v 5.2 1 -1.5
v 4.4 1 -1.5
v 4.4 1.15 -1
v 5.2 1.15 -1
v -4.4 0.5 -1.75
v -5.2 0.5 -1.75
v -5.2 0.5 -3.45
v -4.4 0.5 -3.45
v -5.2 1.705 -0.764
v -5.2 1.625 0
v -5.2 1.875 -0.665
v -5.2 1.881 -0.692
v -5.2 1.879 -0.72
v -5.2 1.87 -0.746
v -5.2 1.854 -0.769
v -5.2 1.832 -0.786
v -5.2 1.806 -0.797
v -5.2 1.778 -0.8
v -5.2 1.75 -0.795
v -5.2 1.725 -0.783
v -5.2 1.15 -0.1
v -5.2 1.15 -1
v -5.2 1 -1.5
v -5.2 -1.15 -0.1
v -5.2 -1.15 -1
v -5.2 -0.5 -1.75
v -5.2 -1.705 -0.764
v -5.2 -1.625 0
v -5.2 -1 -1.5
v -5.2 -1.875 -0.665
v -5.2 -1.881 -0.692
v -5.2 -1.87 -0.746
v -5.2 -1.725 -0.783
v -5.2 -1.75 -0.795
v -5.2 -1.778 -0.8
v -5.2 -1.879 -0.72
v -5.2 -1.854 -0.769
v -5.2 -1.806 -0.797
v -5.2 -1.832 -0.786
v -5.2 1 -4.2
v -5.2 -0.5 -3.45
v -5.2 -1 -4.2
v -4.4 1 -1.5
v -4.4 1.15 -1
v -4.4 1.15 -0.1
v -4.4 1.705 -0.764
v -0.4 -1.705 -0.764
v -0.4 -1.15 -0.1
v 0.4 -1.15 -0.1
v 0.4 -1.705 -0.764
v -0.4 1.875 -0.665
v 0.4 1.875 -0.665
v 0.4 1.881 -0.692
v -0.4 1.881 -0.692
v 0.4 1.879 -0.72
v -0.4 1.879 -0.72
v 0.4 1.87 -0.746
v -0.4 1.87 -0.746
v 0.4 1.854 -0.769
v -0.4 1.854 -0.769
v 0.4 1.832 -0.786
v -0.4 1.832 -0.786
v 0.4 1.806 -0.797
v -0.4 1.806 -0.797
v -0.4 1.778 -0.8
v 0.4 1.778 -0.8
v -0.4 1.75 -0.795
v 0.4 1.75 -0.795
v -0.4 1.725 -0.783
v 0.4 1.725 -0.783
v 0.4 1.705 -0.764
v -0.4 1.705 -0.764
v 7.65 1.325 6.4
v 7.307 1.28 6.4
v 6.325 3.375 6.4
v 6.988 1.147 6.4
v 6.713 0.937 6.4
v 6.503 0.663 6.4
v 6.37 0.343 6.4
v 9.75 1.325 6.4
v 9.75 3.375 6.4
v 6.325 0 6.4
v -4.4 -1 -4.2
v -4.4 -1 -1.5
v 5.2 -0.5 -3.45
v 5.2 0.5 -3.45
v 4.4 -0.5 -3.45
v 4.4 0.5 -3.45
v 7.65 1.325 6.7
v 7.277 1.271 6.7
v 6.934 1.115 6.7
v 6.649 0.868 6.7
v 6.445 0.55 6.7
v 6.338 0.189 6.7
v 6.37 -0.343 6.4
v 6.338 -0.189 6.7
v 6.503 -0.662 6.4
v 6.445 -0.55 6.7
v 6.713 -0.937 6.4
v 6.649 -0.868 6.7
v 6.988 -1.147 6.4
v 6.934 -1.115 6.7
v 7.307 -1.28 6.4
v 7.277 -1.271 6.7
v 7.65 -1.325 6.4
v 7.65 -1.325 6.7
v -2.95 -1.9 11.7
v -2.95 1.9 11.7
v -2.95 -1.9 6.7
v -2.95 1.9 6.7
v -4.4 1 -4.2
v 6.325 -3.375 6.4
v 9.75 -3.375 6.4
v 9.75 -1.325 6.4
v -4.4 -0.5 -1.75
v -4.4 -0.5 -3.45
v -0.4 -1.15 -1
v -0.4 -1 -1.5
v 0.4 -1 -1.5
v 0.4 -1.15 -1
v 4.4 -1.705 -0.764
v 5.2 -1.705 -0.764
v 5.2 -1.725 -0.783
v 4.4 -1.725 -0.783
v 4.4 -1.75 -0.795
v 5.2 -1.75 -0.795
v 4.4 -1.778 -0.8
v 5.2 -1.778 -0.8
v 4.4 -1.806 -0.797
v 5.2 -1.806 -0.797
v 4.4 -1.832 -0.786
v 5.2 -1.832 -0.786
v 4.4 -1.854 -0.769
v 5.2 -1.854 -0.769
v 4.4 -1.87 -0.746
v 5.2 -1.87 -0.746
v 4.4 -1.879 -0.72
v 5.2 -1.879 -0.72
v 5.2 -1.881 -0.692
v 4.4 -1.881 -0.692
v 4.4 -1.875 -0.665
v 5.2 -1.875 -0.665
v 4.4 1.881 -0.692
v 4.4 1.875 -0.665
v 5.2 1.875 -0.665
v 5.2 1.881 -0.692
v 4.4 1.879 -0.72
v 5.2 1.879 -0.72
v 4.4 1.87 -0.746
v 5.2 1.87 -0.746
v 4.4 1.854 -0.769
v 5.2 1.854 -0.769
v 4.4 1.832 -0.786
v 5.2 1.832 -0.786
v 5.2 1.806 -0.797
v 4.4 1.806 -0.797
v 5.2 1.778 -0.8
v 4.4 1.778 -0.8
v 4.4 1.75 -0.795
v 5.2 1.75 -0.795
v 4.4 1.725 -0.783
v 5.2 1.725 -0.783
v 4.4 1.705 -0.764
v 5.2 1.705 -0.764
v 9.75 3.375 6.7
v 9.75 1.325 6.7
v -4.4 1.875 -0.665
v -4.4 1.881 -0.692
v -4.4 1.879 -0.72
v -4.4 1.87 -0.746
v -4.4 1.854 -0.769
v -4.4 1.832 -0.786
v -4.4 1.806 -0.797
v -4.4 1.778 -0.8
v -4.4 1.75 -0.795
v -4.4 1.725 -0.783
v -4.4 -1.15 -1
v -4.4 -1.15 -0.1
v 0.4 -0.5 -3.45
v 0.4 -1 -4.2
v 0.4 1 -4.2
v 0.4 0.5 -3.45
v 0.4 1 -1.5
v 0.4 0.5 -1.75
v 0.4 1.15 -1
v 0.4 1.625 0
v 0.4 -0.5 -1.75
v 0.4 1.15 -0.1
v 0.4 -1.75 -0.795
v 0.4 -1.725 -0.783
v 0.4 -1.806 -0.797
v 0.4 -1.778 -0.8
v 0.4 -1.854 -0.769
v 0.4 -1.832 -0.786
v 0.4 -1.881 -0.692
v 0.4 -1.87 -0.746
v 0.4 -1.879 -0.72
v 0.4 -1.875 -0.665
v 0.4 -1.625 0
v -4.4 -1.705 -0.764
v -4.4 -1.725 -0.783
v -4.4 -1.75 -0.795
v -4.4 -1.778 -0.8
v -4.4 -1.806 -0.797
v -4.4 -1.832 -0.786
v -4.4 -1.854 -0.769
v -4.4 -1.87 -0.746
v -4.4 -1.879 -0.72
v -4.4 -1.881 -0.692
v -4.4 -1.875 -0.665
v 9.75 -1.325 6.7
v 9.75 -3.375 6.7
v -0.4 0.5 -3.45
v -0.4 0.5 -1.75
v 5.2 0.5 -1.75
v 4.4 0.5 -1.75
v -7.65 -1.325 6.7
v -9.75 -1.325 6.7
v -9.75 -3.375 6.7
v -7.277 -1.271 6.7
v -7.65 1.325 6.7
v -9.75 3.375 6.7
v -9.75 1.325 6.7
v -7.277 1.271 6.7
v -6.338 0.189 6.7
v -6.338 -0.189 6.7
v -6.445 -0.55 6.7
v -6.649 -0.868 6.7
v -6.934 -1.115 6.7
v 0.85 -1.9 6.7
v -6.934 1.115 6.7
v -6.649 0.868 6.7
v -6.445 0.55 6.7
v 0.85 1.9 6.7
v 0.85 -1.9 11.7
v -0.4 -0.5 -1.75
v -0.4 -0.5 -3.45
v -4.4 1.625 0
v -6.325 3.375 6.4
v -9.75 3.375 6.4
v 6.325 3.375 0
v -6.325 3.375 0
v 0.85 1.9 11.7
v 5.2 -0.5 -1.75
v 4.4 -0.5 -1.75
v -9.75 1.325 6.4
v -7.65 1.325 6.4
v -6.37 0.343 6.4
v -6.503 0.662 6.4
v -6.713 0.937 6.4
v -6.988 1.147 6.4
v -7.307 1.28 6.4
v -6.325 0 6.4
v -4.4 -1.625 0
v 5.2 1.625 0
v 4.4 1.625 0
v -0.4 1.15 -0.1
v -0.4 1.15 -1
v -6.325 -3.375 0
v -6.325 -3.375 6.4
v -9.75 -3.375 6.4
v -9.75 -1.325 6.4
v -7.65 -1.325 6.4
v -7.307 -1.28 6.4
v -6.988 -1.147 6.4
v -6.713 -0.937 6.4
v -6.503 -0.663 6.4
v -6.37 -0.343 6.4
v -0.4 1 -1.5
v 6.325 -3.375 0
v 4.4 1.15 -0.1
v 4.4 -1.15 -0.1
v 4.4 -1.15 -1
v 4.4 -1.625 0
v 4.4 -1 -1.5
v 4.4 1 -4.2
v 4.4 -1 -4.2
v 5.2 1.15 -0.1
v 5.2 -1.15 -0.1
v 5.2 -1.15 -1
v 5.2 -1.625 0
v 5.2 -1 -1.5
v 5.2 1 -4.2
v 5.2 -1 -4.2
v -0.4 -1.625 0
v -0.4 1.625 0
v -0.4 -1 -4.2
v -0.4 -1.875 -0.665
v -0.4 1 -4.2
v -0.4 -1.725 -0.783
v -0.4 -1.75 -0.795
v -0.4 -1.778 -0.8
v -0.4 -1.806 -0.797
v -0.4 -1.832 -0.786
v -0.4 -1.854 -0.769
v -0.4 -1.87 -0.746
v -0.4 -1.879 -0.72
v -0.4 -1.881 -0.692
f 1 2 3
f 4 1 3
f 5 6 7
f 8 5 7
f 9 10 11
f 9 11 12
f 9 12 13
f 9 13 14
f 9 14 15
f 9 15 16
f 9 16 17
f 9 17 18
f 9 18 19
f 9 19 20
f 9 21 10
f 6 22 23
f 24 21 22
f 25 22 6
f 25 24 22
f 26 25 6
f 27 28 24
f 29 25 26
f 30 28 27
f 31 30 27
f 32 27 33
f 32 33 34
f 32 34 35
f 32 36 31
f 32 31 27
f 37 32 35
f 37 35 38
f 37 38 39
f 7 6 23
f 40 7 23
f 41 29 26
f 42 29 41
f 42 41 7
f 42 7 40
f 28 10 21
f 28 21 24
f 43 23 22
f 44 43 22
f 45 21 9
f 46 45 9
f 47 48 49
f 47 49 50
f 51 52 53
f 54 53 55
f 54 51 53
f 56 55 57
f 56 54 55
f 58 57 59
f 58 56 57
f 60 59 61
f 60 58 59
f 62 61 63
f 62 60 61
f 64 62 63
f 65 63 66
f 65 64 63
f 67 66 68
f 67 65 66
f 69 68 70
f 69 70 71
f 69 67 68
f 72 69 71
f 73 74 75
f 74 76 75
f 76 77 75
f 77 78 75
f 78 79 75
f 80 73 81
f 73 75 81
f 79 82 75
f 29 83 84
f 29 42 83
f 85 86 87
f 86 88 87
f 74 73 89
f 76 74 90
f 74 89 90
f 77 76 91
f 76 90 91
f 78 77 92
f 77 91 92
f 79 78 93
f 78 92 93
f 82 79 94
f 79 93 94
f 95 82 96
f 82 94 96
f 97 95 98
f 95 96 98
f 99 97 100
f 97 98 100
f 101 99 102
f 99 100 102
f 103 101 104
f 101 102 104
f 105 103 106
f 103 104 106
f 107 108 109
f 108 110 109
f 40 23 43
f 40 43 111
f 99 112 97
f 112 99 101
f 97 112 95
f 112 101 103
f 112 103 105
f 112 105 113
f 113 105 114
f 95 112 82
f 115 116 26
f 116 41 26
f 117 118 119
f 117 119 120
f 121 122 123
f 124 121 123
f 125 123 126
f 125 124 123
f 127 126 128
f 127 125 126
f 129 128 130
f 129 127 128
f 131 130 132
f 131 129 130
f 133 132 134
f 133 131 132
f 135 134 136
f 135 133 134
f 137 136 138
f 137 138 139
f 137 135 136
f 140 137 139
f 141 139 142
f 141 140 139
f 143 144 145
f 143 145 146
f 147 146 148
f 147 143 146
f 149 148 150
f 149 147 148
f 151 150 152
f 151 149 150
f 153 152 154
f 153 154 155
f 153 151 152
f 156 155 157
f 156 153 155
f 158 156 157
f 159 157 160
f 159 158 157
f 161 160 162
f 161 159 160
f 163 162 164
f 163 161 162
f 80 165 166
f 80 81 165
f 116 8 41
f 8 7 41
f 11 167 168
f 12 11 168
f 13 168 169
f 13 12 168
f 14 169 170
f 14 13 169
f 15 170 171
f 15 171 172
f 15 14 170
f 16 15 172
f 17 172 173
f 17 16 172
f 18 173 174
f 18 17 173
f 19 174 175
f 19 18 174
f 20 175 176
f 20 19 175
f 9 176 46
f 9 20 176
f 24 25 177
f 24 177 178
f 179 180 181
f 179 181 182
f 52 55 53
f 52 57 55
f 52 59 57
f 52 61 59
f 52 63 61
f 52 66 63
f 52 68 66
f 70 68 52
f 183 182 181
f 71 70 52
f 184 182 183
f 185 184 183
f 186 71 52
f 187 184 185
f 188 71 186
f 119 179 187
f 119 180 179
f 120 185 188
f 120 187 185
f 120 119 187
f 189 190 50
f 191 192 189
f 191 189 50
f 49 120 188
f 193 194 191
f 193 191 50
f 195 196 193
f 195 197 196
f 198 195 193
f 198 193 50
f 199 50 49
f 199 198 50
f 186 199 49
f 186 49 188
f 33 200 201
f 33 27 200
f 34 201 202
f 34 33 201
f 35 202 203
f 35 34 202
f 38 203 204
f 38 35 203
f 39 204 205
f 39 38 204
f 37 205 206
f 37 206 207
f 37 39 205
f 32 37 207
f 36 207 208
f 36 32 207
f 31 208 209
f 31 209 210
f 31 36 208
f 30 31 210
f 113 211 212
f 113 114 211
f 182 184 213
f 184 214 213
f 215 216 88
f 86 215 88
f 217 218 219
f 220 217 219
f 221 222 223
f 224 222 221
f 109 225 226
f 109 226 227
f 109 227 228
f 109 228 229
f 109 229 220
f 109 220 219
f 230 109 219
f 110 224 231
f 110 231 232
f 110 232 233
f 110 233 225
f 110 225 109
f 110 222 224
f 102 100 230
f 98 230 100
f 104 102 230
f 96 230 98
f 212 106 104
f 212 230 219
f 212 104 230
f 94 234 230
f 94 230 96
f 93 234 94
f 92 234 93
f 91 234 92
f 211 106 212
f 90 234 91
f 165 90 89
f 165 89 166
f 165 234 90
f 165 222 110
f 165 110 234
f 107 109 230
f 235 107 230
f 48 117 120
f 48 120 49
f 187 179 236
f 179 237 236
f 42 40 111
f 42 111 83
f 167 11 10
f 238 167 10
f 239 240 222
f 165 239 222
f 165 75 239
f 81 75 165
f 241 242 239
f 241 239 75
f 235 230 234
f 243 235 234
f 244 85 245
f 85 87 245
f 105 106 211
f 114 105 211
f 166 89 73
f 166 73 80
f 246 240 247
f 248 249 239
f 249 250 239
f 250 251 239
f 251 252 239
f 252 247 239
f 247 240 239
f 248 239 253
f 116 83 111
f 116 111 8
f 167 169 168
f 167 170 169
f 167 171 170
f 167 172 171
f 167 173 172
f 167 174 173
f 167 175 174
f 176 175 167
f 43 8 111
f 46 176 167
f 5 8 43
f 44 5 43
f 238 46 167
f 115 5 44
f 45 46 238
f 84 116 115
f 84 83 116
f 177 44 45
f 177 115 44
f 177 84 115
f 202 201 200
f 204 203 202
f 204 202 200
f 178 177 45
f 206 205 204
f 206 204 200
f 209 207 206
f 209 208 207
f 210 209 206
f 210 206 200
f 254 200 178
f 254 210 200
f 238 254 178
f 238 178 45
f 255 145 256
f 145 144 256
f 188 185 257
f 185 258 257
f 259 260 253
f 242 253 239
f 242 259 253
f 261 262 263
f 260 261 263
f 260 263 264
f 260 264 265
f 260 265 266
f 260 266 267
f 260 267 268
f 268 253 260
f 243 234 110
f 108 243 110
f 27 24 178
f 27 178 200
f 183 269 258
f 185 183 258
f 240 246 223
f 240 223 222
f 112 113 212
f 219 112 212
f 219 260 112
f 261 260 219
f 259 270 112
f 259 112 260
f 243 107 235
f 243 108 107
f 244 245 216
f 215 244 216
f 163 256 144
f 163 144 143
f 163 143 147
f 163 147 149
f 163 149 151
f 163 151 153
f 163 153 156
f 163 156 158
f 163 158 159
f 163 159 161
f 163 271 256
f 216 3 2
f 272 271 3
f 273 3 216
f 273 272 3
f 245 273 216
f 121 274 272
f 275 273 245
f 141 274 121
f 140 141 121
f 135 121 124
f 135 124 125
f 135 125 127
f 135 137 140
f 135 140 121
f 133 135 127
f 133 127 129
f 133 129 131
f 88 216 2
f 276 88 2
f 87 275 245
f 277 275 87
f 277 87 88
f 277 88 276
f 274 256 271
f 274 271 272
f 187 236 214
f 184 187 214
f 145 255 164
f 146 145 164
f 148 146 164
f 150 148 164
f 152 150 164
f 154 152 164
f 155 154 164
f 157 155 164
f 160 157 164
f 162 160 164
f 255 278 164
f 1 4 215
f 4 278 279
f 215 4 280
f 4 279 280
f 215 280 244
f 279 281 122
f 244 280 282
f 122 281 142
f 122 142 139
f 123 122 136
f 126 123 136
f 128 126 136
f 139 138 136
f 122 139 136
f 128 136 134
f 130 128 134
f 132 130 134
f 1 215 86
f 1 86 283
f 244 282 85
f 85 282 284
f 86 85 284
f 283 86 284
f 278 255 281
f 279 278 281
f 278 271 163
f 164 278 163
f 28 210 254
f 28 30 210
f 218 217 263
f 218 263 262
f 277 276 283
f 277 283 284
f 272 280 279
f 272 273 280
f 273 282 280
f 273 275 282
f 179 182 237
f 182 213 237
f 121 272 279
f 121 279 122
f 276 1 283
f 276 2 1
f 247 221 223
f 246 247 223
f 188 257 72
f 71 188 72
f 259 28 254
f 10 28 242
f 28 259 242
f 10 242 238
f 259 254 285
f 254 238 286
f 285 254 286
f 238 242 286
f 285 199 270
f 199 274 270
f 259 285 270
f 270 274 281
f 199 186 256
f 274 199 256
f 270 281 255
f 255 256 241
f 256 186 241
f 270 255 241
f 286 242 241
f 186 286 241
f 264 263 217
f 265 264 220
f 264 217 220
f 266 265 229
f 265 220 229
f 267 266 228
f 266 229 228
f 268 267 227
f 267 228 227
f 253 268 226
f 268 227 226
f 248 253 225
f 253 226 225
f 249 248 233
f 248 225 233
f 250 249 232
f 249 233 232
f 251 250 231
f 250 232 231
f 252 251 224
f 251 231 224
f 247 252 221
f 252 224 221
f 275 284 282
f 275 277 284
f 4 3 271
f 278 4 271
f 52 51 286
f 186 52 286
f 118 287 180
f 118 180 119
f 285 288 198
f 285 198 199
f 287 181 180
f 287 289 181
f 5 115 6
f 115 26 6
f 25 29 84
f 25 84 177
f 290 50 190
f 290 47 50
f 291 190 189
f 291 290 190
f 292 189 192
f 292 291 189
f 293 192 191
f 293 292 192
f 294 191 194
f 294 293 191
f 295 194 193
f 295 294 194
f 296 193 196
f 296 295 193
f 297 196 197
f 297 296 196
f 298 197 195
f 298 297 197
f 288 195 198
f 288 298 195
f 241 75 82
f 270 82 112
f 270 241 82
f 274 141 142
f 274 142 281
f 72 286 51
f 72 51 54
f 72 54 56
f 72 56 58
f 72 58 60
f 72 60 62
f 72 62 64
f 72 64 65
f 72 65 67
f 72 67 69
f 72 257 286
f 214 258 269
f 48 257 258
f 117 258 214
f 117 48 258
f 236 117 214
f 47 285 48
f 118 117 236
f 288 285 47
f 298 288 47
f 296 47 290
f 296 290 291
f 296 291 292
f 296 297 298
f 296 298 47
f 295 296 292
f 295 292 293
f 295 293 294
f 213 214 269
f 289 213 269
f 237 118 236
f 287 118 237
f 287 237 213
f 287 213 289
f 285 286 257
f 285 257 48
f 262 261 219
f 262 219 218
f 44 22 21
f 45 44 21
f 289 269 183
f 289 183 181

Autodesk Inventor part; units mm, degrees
ref_plane "YZ Plane" through (0, 0, 0) normal (1, 0, 0) x (0, 1, 0)
ref_plane "XZ Plane" through (0, 0, 0) normal (0, 1, 0) x (-1, 0, 0)
ref_plane "XY Plane" through (0, 0, 0) normal (0, 0, 1) x (1, 0, 0)
sketch "Náčrt1" plane through (0, 0, 0) normal (0, 0, 1) x (1, 0, 0)
  line L0 (-6.325, 3.375) -> (6.325, 3.375)
  line L1 (6.325, 3.375) -> (6.325, -3.375)
  line L2 (6.325, -3.375) -> (-6.325, -3.375)
  line L3 (-6.325, -3.375) -> (-6.325, 3.375)
  line L4 (0, 0) -> (-6.325, 3.375) construction
  line L5 (6.325, 3.375) -> (0, 0) construction
  line L6 (6.325, -3.375) -> (0, 0) construction
  dimension "d0" = 12.65
  dimension "d1" = 6.75
extrude "Vysunutí1" add sketch "Náčrt1" along normal blind 6.4
sketch "Náčrt2" plane through (0, 0, 6.4) normal (0, 0, 1) x (1, 0, 0)
  line L0 (-9.75, 3.375) -> (9.75, 3.375)
  line L1 (9.75, 3.375) -> (9.75, -3.375)
  line L2 (9.75, -3.375) -> (-9.75, -3.375)
  line L3 (-9.75, -3.375) -> (-9.75, 3.375)
  line L4 (6.325, -3.375) -> (6.325, 3.375) projected
  line L5 (6.325, 0) -> (9.75, 0) construction
  line L6 (-9.75, 0) -> (-6.325, 0) construction
  line L7 (-6.325, 3.375) -> (-6.325, -3.375) projected
  point P0 (0, 0)
  dimension "d4" = 19.5
extrude "Vysunutí2" add sketch "Náčrt2" along normal blind 0.3
sketch "Náčrt3" plane through (0, 0, 6.7) normal (0, 0, 1) x (1, 0, 0)
  circle A0 centre (-7.65, 0) radius 1.325
  circle A1 centre (7.65, 0) radius 1.325
  line L0 (-6.325, 3.375) -> (-6.325, -3.375) projected
  line L1 (6.325, -3.375) -> (6.325, 3.375) projected
  line L2 (-7.65, 1.325) -> (-9.75, 1.325)
  line L3 (-9.75, 3.375) -> (-9.75, -3.375) projected
  line L4 (-7.65, -1.325) -> (-9.75, -1.325)
  line L5 (7.65, 1.325) -> (9.75, 1.325)
  line L6 (9.75, -3.375) -> (9.75, 3.375) projected
  line L7 (7.65, -1.325) -> (9.75, -1.325)
  point P0 (0, 0)
  dimension "d7" = 2.65
extrude "Vysunutí3" cut sketch "Náčrt3" against normal up to surface (0.3 mm away)
sketch "Náčrt4" plane through (-6.325, -3.375, 0) normal (-1, 0, 0) x (0, 0, 1)
  line L0 (0, 0) -> (0, 6.75) projected
  line L1 (-1.5, 4.375) -> (-4.2, 4.375)
  line L2 (-4.2, 4.375) -> (-4.2, 2.375)
  line L3 (-4.2, 2.375) -> (-1.5, 2.375)
  line L4 (-3.45, 2.875) -> (-1.75, 2.875)
  line L5 (-1.75, 2.875) -> (-1.75, 3.875)
  line L6 (-1.75, 3.875) -> (-3.45, 3.875)
  line L7 (-3.45, 3.875) -> (-3.45, 2.875)
  line L8 (0, 0) -> (6.4, 0) projected
  line L9 (-4.2, 2.375) -> (0, 0) construction
  line L10 (-4.2, 4.375) -> (0, 6.75) construction
  line L11 (-1.5, 4.375) -> (-1, 4.525)
  line L12 (-1.5, 2.375) -> (-1, 2.225)
  line L13 (-1, 4.525) -> (-0.1, 4.525)
  line L14 (-0.1, 4.525) -> (-0.7641, 5.0796)
  arc A0 (-0.6648, 5.25) -> (-0.7641, 5.0796) centre (-0.7, 5.1564) ccw
  line L15 (-0.6648, 5.25) -> (0, 5)
  line L16 (-1, 2.225) -> (-0.1, 2.225)
  line L17 (-0.1, 2.225) -> (-0.7641, 1.6704)
  arc A1 (-0.7641, 1.6704) -> (-0.6648, 1.5) centre (-0.7, 1.5936) ccw
  line L18 (-0.6648, 1.5) -> (0, 1.75)
  line L19 (-0.1, 4.525) -> (0, 5) construction
  line L20 (-0.1, 2.225) -> (0, 1.75) construction
  point P0 (0, 3.375)
  dimension "d10" = 2
  dimension "d11" = 4.2
  dimension "d12" = 0.5
  dimension "d13" = 0.5
  dimension "d14" = 1.75
  dimension "d16" = 0.75
  dimension "d18" = 1.5
  dimension "d19" = 2.3
  dimension "d20" = 1
  dimension "d22" = 0.8
  dimension "d23" = 3.75
  dimension "d24" = 0.1
  dimension "d25" = 3.25
  dimension "d27" = 0.1
extrude "Vysunutí4" add sketch "Náčrt4" against normal up to surface (12.65 mm away)
sketch "Náčrt5" plane through (-6.325, -3.375, 0) normal (0, -1, 0) x (1, 0, 0)
  line L0 (12.65, 0) -> (12.65, 6.4) projected
  line L1 (12.65, 0) -> (11.525, 0)
  line L2 (11.525, 0) -> (11.525, -4.2)
  line L3 (11.525, -4.2) -> (12.65, -4.2)
  line L4 (12.65, -4.2) -> (12.65, 0)
  line L5 (0, 0) -> (12.65, 0) projected
  line L6 (10.725, -4.2) -> (6.725, -4.2)
  line L7 (6.725, -4.2) -> (6.725, 0)
  line L8 (6.725, 0) -> (10.725, 0)
  line L9 (10.725, 0) -> (10.725, -4.2)
  line L10 (5.925, -4.2) -> (1.925, -4.2)
  line L11 (1.925, -4.2) -> (1.925, 0)
  line L12 (1.925, 0) -> (5.925, 0)
  line L13 (5.925, 0) -> (5.925, -4.2)
  line L14 (1.125, -4.2) -> (0, -4.2)
  line L15 (0, -4.2) -> (0, 0)
  line L16 (0, 0) -> (1.125, 0)
  line L17 (1.125, 0) -> (1.125, -4.2)
  line L18 (0, -4.2) -> (12.65, -4.2) projected
  line L19 (11.525, -2.1) -> (10.725, -2.1) construction
  line L20 (6.725, -2.1) -> (5.925, -2.1) construction
  line L21 (1.925, -2.1) -> (1.125, -2.1) construction
  point P0 (6.325, 0)
  point P1 (1.125, 0)
  dimension "d30" = 0.8
  dimension "d31" = 4
extrude "Vysunutí5" cut sketch "Náčrt5" against normal through all contours L4 L3 L2 L1 | L9 L6 L7 L5 | L13 L10 L11 L5 | L17 L14 L15 L5
sketch "Náčrt6" plane through (0, 0, 6.7) normal (0, 0, 1) x (1, 0, 0)
  line L0 (0.85, 1.9) -> (-2.95, 1.9)
  line L1 (-2.95, 1.9) -> (-2.95, -1.9)
  line L2 (-2.95, -1.9) -> (0.85, -1.9)
  line L3 (0.85, -1.9) -> (0.85, 1.9)
  line L4 (-9.75, -1.325) -> (-9.75, -3.375) projected
  point P0 (0, 0)
  point P1 (0.85, 0)
  dimension "d34" = 3.8
  dimension "d35" = 6.8
extrude "Vysunutí6" add sketch "Náčrt6" along normal blind 5
properties part number "switch"
